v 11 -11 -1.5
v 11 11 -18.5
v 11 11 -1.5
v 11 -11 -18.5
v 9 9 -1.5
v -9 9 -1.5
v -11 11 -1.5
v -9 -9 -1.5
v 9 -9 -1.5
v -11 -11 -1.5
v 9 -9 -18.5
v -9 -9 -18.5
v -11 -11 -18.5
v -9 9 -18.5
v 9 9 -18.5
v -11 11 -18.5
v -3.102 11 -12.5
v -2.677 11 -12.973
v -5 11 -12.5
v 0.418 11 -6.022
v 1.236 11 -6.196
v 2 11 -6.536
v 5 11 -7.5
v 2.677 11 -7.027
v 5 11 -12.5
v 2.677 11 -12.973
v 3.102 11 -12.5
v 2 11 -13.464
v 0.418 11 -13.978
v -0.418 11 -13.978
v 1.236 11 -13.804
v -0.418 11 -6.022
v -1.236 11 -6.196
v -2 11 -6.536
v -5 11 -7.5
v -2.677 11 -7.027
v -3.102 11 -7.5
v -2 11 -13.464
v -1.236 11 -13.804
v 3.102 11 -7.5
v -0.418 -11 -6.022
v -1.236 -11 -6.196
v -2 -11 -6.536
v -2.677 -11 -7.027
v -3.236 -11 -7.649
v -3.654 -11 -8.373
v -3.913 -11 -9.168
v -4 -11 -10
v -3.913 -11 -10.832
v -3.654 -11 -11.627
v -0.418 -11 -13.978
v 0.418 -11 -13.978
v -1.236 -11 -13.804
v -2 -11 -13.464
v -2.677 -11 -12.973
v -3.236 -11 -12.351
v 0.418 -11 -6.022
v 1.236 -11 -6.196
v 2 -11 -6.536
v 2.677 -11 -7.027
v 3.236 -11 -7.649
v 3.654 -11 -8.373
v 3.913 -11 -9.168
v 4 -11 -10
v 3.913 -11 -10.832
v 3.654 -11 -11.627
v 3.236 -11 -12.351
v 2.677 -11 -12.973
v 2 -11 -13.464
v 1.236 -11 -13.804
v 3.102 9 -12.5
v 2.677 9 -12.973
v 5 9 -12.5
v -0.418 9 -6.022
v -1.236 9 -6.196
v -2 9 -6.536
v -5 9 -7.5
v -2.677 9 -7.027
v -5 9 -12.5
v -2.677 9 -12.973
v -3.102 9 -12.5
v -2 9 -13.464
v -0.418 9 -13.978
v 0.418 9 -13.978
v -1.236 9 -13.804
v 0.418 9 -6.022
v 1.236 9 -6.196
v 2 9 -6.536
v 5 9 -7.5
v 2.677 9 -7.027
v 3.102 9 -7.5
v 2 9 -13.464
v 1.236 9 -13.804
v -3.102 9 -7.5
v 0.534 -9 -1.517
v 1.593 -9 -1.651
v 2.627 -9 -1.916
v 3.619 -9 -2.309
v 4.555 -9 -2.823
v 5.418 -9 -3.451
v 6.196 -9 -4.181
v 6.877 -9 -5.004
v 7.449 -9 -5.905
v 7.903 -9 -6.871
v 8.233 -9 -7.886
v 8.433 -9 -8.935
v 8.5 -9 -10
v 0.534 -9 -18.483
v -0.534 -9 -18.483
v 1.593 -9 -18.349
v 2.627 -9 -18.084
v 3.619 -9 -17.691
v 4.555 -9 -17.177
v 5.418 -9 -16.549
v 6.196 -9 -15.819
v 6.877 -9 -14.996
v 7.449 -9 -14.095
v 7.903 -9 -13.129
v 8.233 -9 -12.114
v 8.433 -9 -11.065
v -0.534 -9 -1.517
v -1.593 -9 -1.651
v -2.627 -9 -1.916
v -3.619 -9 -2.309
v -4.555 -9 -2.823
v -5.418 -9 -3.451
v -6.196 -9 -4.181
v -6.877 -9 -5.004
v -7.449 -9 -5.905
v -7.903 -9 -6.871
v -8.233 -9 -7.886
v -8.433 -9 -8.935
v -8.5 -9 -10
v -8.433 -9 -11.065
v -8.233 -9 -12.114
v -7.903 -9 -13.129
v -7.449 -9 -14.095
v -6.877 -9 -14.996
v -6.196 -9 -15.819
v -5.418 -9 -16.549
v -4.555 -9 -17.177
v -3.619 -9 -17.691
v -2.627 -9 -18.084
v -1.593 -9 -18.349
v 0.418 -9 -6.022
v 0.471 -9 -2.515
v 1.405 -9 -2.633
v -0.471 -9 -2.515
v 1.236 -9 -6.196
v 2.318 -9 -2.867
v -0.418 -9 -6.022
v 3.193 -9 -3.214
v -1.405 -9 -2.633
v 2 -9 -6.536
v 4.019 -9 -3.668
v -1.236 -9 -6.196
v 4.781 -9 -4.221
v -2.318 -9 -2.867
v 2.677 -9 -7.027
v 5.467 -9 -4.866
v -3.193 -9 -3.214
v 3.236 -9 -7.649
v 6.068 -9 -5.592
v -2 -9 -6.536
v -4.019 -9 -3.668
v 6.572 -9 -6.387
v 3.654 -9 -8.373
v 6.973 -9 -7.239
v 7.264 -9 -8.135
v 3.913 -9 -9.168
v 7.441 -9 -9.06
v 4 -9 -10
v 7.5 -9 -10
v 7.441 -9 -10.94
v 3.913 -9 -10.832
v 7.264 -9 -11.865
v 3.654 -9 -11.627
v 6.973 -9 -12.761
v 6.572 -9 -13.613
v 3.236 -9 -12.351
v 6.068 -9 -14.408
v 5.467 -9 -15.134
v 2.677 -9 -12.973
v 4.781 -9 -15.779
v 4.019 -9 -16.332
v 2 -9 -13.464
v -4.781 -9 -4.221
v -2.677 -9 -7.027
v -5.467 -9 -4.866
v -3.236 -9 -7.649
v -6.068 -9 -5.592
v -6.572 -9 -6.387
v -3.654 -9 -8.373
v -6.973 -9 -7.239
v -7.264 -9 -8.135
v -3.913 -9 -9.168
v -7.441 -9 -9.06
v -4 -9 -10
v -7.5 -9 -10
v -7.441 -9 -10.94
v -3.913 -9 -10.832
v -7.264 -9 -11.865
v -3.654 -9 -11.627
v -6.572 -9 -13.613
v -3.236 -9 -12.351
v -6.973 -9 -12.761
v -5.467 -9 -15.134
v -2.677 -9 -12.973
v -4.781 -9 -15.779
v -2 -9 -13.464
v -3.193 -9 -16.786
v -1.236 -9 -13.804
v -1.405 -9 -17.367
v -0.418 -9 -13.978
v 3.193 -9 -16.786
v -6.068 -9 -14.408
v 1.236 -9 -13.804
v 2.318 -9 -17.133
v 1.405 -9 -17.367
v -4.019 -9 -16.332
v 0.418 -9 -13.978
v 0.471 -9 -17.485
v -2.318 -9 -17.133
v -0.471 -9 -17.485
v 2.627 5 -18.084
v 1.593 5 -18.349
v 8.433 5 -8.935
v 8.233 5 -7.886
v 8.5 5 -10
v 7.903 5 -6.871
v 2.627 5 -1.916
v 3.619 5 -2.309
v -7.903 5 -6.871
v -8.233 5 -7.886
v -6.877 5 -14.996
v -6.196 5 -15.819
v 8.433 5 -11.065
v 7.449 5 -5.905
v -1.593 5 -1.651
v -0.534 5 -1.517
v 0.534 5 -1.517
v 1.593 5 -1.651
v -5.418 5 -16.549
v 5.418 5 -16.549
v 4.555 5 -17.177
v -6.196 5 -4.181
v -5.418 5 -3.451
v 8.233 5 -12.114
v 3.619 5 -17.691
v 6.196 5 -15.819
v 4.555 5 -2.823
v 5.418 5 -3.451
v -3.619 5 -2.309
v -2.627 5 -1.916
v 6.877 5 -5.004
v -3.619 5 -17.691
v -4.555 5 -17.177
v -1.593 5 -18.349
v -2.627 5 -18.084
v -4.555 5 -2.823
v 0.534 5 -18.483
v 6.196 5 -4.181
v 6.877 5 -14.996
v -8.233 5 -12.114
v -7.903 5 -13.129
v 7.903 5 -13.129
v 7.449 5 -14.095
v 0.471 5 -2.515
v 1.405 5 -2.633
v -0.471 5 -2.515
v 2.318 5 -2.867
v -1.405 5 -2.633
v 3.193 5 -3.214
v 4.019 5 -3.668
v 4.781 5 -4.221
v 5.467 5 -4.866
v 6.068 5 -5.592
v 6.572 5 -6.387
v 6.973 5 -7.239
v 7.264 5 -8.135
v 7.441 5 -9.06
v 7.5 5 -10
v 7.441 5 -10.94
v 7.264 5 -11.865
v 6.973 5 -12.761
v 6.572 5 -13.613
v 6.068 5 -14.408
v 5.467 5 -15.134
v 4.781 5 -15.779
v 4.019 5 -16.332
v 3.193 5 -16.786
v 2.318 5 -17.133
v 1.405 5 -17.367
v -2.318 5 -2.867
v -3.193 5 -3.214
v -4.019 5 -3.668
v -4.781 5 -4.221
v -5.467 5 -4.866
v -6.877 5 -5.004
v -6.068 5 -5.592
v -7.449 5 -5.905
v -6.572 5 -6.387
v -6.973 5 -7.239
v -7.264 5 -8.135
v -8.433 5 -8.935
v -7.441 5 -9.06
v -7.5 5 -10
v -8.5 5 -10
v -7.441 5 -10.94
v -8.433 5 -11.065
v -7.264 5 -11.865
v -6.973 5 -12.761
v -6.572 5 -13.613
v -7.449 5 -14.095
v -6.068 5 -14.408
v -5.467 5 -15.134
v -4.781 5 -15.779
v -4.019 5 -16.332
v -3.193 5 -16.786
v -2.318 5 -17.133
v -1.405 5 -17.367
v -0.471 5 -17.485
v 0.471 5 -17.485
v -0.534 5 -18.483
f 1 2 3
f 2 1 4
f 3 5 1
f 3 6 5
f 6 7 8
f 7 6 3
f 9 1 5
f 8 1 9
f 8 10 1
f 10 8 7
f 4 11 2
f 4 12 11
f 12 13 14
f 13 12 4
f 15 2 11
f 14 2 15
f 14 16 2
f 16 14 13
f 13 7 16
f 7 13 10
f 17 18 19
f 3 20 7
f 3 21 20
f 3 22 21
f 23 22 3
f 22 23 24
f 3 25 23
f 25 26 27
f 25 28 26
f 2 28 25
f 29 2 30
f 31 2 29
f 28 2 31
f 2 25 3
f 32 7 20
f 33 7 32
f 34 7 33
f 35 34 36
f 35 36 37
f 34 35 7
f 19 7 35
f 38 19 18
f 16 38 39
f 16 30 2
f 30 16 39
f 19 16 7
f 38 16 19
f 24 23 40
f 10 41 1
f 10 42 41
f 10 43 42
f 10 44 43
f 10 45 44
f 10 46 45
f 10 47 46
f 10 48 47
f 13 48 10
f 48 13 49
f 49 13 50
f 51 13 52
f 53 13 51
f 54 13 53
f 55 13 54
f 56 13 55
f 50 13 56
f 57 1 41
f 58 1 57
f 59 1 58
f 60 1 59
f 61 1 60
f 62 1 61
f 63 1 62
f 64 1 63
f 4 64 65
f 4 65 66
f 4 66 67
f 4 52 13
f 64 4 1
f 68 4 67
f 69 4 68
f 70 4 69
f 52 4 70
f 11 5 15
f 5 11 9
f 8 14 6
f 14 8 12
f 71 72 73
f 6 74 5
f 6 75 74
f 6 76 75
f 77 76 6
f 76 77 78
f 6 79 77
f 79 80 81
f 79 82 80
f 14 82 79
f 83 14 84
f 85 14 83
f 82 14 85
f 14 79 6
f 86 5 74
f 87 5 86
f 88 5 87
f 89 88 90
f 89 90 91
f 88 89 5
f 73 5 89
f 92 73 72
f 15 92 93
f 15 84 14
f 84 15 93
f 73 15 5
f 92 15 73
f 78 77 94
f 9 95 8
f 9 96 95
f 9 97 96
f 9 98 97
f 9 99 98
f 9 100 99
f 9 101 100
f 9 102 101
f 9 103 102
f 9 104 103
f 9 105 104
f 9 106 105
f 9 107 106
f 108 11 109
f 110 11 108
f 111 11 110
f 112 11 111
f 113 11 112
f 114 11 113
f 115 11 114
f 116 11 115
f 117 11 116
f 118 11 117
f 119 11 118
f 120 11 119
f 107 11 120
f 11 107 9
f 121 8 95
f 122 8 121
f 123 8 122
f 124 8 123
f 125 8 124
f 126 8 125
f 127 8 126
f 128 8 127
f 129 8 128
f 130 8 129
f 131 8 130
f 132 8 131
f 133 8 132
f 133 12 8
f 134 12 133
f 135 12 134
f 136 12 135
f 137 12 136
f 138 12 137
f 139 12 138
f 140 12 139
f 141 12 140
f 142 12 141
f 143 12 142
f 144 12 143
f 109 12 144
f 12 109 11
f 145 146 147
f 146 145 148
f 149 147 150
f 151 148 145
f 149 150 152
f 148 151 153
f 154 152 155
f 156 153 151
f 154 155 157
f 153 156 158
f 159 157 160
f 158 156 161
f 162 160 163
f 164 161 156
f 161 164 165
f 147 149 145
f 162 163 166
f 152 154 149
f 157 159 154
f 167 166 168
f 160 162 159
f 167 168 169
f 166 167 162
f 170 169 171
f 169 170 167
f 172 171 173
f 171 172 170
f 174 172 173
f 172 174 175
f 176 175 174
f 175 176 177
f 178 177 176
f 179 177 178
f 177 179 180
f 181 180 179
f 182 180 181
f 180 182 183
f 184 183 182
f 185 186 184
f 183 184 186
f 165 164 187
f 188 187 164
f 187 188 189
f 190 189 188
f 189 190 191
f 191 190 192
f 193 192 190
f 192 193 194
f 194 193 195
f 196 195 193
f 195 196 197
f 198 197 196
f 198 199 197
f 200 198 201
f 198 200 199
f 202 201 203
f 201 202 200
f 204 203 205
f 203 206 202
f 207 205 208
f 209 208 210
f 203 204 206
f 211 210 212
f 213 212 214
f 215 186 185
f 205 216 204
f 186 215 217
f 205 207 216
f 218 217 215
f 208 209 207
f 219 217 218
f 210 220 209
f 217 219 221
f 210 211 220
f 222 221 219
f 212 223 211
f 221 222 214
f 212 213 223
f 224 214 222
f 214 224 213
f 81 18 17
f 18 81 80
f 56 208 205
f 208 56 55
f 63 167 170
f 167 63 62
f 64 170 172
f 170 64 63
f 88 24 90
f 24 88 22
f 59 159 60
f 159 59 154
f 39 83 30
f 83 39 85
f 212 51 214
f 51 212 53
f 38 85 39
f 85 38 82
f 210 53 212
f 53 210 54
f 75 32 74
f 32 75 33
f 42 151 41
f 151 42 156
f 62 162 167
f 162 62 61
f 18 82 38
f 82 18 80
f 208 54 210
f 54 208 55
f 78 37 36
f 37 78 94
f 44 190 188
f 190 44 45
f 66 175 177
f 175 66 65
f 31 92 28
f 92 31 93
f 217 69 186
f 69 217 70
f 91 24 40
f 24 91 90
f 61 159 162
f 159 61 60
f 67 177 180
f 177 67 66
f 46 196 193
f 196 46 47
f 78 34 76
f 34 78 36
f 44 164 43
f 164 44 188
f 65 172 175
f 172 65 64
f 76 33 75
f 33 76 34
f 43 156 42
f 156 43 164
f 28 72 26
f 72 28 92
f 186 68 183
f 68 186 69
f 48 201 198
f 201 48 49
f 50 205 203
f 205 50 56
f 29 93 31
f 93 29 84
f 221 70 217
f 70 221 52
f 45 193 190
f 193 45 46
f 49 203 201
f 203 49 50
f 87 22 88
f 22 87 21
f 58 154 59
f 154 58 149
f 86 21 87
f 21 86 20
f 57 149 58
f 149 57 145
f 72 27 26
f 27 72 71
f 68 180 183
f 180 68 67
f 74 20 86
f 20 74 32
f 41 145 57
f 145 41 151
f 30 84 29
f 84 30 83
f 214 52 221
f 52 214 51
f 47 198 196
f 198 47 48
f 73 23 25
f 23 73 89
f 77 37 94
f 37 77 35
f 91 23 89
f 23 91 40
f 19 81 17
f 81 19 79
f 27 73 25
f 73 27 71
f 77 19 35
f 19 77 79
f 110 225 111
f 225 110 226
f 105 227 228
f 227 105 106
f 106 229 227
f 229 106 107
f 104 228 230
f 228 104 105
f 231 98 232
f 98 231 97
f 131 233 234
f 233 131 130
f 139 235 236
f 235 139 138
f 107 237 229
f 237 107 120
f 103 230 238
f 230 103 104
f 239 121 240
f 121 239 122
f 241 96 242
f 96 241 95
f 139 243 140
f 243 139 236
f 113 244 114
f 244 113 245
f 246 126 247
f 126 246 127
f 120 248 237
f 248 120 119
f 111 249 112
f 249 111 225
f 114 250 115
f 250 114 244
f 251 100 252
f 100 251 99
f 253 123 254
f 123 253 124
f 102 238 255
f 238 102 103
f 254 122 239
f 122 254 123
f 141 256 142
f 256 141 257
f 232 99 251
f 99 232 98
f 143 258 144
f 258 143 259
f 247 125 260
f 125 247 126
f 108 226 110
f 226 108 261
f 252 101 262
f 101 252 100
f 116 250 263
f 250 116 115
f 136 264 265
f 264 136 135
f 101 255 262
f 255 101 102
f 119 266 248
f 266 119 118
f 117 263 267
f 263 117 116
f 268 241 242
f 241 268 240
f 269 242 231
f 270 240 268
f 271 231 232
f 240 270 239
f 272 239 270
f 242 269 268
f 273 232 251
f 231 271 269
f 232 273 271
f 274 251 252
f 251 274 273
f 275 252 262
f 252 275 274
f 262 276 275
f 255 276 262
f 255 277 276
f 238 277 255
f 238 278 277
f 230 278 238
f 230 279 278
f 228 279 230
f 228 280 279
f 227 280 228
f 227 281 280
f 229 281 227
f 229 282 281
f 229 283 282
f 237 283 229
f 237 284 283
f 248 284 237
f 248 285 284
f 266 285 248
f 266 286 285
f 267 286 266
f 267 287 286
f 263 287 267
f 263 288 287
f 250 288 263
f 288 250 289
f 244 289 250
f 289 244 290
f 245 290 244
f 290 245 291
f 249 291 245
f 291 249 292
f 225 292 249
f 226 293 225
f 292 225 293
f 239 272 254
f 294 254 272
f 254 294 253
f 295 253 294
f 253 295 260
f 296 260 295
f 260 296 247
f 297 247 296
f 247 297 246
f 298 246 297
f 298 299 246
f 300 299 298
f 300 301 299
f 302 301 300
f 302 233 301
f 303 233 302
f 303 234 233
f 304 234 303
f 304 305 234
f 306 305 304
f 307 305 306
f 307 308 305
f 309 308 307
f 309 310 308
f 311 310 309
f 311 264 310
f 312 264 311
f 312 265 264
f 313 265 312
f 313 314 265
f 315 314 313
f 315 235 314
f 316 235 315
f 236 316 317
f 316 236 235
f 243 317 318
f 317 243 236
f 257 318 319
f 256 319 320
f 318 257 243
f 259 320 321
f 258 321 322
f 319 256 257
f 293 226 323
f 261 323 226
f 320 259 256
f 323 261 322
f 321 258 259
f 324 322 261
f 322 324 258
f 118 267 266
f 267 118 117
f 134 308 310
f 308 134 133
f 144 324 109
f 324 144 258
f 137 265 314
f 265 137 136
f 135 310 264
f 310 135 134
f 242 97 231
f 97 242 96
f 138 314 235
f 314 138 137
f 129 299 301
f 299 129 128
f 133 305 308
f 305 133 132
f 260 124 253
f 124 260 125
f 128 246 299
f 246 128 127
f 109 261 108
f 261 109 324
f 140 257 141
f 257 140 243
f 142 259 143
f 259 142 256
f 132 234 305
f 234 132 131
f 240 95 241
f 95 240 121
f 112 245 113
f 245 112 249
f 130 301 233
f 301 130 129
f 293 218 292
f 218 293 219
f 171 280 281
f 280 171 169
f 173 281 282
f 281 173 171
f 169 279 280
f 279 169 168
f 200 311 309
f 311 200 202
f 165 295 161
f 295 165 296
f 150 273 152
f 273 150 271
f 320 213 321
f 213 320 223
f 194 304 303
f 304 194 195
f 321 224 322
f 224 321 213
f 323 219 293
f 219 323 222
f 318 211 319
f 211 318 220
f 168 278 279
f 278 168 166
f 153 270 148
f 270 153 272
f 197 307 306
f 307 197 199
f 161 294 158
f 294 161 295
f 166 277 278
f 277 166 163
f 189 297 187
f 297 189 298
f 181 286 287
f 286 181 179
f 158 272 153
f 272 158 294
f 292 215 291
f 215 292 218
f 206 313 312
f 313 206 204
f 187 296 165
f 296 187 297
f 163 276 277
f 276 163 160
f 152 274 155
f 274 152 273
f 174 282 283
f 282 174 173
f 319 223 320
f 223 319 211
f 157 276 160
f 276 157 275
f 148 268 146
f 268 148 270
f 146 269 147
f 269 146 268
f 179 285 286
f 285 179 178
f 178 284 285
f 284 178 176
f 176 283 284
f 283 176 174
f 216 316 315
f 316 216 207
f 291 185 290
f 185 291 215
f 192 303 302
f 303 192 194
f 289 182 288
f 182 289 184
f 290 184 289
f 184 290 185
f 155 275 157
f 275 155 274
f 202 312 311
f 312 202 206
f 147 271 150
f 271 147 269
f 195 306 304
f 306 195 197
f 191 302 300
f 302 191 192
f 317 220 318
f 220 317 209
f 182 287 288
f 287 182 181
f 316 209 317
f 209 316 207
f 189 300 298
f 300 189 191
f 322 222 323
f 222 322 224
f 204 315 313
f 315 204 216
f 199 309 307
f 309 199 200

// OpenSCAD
// TERNARY OPTICAL COMPUTER - SENSOR HOUSING
// Fits: Adafruit AS7341 Breakout Board
// Mates to: Mixing Core Output

// --- PARAMETERS ---
sensor_w = 18; // PCB Width approx
sensor_h = 18; // PCB Height approx
sensor_d = 5;  // PCB Thickness clearance
wall = 2;
mount_d = 15; // Mates to Mixing Core Output Port

module sensor_box() {
    difference() {
        // Body
        cube([sensor_w + wall*2, sensor_h + wall*2, sensor_d + 10 + wall], center=true);
        
        // PCB Slot
        translate([0,0,2]) cube([sensor_w, sensor_h, sensor_d + 20], center=true);
        
        // Light Path Hole (Front)
        rotate([90,0,0]) cylinder(h=50, d=8, center=true, $fn=30);
        
        // Wire Exit (Side)
        translate([0, 10, 0]) cube([10, 10, 5], center=true);
    }
}

module connector_tube() {
    difference() {
        cylinder(h=15, d=mount_d + wall, $fn=50);
        cylinder(h=16, d=mount_d, $fn=50); // Slips OVER the mixer port
    }
}

// --- ASSEMBLY ---
union() {
    translate([0,0,-10]) sensor_box();
    rotate([90,0,0]) translate([0, -10, -5]) connector_tube();
}
